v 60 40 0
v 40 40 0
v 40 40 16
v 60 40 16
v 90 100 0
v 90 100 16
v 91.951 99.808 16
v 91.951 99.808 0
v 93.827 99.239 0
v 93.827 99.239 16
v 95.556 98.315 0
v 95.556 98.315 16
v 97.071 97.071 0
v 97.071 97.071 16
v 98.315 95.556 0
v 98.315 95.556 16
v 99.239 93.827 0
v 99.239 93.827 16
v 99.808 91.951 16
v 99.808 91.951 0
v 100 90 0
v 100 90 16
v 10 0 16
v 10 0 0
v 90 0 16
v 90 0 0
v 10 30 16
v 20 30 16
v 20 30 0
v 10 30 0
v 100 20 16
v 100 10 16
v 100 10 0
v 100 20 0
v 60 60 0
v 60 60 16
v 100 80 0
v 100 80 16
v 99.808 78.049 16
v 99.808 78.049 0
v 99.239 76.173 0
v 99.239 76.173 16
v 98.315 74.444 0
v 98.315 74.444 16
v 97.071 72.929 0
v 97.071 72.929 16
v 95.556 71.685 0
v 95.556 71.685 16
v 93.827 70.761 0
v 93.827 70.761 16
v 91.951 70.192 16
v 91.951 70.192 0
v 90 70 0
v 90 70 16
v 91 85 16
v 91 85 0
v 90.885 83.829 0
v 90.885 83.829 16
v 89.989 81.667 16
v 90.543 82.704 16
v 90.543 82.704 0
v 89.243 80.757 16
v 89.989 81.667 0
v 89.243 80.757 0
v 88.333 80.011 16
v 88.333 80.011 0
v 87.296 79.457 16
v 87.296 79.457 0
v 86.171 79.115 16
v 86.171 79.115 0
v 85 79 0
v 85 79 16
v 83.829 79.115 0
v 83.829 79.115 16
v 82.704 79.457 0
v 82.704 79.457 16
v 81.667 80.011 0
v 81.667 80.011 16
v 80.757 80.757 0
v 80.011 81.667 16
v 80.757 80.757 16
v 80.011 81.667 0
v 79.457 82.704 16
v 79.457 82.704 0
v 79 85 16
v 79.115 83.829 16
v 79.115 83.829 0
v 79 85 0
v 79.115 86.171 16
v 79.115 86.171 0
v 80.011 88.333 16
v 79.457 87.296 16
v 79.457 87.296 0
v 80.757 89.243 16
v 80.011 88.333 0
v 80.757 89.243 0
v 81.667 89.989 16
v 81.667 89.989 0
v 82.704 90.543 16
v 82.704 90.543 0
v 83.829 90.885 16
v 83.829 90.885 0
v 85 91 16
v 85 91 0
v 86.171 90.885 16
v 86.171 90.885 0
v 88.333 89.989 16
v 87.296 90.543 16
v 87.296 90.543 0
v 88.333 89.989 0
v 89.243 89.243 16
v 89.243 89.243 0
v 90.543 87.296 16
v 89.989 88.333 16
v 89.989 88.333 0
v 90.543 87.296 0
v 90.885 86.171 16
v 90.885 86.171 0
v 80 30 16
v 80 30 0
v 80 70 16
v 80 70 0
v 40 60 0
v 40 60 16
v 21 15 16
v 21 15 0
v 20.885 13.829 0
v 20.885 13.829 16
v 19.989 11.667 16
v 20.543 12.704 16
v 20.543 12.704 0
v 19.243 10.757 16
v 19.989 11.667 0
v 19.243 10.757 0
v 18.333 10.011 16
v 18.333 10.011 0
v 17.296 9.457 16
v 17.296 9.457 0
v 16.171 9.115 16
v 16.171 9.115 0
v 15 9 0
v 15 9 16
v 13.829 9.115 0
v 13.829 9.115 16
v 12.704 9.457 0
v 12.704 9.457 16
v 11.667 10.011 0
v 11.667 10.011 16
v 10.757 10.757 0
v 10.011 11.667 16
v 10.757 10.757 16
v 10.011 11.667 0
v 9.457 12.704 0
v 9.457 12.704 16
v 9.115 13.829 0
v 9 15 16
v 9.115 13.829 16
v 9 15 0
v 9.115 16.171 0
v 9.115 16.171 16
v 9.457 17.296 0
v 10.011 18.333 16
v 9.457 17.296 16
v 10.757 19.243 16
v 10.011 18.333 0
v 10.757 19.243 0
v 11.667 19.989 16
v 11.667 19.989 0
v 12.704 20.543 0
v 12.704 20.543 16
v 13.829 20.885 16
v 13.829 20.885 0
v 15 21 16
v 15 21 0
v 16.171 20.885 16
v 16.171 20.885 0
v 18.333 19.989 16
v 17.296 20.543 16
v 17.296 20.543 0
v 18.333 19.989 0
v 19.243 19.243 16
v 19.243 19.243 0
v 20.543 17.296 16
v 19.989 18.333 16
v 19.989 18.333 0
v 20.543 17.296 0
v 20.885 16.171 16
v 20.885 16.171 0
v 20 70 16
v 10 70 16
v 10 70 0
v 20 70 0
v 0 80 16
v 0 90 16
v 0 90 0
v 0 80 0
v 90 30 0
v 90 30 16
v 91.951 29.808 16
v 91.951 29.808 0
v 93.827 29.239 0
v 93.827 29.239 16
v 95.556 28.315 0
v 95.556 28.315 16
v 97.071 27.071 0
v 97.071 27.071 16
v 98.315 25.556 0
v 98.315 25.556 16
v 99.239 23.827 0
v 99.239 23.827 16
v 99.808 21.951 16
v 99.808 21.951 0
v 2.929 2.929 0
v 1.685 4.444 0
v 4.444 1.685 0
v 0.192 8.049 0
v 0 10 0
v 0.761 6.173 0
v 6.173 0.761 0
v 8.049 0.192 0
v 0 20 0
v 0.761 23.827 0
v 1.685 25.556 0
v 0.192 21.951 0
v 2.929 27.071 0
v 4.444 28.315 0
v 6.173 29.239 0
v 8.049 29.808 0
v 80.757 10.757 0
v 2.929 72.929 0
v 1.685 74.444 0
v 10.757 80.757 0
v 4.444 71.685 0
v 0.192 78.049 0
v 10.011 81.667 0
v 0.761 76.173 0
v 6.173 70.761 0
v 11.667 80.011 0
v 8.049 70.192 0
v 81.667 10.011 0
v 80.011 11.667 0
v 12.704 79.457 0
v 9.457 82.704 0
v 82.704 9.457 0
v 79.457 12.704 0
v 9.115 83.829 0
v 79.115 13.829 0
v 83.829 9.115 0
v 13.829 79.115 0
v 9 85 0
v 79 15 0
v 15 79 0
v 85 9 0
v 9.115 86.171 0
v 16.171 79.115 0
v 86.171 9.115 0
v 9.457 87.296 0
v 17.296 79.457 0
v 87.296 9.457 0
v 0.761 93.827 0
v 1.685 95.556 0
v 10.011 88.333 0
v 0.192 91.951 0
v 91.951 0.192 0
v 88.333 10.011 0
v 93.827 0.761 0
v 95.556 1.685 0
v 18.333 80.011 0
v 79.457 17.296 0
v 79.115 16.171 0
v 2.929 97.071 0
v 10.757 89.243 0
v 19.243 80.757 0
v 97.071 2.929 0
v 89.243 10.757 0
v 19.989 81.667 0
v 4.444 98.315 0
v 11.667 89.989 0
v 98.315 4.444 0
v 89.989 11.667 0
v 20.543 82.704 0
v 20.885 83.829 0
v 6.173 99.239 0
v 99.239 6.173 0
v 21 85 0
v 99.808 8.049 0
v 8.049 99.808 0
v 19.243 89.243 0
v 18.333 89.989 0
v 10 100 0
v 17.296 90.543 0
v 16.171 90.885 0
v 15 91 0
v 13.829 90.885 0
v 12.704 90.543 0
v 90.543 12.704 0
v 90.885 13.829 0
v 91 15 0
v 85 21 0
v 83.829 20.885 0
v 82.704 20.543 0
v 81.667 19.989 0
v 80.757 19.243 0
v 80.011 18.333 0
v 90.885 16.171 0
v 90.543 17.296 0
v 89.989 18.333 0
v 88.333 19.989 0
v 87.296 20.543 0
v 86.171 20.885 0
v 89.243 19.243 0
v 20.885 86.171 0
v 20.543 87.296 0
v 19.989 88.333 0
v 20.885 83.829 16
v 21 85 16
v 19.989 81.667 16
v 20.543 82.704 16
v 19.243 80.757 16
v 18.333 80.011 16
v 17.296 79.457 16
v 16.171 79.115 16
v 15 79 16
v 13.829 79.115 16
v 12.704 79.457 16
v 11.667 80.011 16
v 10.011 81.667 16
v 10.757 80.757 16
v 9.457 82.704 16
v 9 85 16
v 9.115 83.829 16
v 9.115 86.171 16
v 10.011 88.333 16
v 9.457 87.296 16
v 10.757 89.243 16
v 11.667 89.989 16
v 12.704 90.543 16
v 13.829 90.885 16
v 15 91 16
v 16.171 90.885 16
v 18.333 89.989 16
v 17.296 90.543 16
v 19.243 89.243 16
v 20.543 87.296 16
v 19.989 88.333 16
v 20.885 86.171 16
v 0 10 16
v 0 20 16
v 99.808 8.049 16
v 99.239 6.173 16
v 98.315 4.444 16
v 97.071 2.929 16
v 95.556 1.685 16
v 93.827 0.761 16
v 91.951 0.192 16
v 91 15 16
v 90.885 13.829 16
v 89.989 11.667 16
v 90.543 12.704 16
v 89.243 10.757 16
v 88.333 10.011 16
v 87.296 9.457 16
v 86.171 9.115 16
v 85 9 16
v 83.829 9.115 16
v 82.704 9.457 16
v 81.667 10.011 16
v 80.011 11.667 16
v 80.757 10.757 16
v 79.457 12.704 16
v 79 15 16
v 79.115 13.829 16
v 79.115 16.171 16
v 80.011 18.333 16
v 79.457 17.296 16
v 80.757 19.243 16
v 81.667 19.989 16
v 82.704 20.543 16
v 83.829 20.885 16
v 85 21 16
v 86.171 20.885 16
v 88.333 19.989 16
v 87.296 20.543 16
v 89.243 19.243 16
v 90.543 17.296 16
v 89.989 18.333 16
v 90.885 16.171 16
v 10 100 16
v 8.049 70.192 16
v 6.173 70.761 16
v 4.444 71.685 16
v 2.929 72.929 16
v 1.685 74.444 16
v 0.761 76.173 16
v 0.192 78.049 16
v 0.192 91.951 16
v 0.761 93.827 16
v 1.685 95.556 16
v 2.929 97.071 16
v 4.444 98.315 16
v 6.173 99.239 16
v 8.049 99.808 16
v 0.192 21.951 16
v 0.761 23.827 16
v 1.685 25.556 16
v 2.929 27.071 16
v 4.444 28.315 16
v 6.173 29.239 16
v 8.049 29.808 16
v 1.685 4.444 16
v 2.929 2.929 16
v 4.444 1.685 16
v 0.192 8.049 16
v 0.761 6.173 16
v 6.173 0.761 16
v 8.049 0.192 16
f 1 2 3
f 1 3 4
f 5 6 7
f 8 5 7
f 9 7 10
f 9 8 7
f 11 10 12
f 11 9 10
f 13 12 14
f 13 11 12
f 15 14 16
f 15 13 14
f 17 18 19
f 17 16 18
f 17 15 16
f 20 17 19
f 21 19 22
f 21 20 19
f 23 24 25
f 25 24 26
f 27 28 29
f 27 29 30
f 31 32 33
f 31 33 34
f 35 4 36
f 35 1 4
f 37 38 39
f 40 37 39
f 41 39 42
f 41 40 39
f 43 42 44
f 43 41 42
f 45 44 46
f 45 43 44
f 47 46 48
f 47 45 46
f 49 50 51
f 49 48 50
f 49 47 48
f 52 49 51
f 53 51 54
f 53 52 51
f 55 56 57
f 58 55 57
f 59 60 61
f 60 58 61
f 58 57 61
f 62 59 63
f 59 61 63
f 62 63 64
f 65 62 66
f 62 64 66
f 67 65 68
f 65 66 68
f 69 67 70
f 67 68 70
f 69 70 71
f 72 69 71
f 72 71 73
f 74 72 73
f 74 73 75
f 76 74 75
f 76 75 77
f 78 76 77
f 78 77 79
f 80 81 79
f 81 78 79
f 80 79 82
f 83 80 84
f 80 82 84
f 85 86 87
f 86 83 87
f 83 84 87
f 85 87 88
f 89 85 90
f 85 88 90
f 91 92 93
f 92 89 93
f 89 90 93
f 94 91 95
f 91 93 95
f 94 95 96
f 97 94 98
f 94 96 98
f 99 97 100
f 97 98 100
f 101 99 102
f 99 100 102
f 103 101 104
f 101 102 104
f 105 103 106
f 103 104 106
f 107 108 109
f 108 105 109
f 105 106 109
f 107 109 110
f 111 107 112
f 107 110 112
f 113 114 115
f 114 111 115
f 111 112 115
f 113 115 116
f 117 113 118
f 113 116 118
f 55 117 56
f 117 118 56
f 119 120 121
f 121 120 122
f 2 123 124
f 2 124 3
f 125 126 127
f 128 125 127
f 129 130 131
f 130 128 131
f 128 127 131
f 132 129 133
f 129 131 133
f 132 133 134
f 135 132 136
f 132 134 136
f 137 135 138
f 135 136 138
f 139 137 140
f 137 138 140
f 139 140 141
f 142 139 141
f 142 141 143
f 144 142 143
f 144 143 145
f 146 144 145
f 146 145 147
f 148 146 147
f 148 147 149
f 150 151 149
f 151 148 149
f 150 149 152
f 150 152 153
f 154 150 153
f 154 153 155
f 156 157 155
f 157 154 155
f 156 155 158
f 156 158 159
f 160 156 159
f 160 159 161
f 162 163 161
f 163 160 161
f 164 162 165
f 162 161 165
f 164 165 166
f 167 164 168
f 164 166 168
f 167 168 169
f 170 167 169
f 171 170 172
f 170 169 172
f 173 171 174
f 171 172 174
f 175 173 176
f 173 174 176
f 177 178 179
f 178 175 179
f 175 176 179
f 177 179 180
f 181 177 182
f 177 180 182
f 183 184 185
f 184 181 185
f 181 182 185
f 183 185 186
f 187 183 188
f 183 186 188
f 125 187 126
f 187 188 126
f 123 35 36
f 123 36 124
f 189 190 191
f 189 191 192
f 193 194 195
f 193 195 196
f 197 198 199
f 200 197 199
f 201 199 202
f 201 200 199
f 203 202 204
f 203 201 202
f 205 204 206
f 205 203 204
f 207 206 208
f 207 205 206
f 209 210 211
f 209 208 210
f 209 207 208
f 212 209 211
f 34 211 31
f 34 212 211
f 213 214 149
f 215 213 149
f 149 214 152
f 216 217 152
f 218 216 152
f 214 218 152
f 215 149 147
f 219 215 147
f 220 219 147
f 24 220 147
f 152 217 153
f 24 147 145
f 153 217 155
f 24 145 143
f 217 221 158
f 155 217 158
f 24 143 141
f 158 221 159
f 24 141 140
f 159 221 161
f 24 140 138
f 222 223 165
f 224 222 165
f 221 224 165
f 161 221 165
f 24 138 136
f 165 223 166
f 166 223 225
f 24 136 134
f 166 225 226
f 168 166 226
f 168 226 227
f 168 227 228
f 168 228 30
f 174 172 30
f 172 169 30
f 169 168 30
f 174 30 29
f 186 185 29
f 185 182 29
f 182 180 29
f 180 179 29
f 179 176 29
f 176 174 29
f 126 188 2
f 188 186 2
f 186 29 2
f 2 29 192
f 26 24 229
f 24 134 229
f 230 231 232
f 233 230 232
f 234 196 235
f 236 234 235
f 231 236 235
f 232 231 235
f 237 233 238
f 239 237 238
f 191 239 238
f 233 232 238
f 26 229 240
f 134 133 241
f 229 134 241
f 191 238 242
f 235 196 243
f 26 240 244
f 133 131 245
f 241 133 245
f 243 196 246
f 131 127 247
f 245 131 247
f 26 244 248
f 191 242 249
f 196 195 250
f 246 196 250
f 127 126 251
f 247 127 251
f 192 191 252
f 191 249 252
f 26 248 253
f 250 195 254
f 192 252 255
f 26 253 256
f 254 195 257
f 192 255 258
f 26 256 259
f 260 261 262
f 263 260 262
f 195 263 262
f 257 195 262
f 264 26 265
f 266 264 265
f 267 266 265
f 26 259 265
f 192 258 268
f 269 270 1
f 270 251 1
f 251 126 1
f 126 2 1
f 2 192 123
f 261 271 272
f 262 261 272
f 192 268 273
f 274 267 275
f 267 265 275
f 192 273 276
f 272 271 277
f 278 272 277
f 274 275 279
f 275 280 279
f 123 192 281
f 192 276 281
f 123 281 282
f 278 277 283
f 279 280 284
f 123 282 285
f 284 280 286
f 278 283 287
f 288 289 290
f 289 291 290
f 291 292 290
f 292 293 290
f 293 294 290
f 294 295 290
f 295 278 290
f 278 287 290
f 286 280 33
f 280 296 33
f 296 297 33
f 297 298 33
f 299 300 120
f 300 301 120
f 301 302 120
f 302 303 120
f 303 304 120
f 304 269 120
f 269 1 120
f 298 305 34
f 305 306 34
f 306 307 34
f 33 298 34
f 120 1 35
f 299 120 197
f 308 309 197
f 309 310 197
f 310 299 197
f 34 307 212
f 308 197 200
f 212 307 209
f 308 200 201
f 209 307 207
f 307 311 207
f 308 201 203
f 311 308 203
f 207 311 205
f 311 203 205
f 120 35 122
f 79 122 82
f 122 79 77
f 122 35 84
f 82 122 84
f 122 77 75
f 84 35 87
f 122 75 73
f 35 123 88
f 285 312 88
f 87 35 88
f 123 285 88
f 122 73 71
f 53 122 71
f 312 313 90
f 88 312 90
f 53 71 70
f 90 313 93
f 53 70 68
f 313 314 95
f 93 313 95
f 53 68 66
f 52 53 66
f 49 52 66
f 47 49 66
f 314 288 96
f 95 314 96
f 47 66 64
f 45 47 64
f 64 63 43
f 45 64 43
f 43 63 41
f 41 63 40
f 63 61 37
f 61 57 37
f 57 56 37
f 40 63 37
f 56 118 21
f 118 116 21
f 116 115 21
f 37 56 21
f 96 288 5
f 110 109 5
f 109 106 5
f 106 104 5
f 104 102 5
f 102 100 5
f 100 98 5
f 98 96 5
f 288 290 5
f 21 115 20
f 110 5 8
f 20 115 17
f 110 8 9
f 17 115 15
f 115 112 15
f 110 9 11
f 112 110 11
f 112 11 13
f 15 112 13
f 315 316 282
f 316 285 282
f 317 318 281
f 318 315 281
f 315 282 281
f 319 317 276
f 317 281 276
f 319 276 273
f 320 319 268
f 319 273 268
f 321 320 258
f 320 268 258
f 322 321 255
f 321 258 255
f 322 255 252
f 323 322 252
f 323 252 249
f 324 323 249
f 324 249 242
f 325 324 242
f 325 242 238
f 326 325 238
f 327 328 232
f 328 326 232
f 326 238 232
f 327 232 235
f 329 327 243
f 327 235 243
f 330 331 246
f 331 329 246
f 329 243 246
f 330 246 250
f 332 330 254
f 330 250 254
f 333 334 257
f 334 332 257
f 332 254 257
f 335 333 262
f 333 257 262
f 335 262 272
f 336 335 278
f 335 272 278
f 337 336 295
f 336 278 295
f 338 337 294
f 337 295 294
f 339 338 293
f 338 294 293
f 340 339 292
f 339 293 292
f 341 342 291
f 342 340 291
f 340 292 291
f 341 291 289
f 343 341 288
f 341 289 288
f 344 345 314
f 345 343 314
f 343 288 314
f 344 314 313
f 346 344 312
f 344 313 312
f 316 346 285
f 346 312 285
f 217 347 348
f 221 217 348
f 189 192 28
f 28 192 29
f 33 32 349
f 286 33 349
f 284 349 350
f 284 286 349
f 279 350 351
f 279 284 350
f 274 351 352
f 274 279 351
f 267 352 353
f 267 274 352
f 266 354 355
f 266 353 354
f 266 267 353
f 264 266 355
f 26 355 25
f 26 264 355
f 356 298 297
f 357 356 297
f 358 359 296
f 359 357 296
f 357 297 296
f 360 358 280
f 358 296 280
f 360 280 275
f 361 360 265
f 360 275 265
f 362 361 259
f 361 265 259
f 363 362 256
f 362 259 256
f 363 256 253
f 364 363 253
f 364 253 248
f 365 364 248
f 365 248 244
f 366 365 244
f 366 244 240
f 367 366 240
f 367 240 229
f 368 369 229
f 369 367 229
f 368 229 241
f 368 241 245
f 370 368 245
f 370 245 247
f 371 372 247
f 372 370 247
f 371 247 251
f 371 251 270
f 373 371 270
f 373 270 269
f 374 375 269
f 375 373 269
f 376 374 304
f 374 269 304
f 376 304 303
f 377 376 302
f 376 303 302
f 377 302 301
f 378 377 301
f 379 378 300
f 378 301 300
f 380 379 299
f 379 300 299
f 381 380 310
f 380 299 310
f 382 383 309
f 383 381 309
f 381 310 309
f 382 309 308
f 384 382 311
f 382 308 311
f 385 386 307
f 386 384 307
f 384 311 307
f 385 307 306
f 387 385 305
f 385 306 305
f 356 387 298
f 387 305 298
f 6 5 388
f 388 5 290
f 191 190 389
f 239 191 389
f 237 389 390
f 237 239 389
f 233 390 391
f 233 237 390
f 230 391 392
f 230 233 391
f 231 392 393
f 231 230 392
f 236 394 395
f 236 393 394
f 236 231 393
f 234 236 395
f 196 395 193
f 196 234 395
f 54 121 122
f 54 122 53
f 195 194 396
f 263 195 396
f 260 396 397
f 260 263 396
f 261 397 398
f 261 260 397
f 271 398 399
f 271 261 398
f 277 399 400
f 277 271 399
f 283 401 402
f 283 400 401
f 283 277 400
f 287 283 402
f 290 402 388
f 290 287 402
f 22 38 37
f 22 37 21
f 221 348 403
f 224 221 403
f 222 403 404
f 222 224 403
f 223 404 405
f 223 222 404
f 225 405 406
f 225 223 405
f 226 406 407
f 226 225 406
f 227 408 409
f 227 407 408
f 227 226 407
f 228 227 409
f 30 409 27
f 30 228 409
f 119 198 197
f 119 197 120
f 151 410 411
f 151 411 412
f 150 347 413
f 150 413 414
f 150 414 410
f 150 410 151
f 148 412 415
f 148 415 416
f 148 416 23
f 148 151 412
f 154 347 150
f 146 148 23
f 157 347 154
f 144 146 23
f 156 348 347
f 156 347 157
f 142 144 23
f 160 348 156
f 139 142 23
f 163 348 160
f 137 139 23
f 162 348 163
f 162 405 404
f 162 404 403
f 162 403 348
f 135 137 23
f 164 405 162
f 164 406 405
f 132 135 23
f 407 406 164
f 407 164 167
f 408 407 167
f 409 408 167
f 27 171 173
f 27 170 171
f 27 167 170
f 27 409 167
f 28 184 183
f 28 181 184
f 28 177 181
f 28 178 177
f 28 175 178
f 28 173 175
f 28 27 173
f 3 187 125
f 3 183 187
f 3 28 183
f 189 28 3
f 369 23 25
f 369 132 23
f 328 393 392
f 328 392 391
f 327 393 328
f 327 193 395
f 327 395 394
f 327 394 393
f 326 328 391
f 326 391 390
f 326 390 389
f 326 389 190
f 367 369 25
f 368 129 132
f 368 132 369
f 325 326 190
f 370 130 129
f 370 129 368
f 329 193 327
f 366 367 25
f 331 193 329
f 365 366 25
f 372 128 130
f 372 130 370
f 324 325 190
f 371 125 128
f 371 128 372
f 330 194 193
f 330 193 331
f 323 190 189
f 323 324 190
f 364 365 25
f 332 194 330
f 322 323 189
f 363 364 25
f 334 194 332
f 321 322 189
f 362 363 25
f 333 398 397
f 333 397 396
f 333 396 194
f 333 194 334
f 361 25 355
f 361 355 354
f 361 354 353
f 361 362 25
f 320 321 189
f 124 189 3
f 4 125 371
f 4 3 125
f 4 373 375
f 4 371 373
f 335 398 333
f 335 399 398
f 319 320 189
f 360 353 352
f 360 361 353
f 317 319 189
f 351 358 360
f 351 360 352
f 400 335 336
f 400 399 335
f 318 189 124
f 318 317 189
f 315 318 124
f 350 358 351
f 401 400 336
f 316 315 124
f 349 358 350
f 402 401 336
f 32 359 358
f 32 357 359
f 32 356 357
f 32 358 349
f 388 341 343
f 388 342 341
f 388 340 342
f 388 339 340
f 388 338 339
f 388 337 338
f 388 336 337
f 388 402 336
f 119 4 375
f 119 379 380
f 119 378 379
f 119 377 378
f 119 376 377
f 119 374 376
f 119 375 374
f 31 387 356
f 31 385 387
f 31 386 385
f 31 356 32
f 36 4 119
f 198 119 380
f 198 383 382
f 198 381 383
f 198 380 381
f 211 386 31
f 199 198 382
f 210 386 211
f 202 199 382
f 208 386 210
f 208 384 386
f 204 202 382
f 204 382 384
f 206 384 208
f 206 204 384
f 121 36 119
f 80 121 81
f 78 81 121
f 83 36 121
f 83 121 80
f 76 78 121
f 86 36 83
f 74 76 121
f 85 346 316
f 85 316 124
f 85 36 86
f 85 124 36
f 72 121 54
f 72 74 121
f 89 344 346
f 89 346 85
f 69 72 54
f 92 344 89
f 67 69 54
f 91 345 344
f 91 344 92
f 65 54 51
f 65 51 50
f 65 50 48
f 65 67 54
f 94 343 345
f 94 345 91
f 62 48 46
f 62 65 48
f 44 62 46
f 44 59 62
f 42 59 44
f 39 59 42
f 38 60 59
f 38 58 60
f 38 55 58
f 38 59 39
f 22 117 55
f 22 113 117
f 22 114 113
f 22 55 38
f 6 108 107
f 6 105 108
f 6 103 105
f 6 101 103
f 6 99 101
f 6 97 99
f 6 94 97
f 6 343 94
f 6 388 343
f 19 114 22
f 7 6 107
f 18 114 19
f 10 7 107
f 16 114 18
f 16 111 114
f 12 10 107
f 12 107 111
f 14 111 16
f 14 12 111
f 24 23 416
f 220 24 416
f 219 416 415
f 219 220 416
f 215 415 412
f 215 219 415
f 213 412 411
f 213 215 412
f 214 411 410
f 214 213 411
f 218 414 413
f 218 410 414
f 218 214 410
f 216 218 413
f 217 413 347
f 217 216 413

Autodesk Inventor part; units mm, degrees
ref_plane "YZ Plane" through (0, 0, 0) normal (1, 0, 0) x (0, 1, 0)
ref_plane "XZ Plane" through (0, 0, 0) normal (0, 1, 0) x (-1, 0, 0)
ref_plane "XY Plane" through (0, 0, 0) normal (0, 0, 1) x (1, 0, 0)
sketch "Sketch1" plane through (0, 0, 0) normal (0, 0, 1) x (1, 0, 0)
  line L0 (10, 0) -> (90, 0)
  line L1 (100, 10) -> (100, 20)
  line L2 (90, 30) -> (80, 30)
  line L3 (80, 30) -> (80, 70)
  line L4 (80, 70) -> (90, 70)
  line L5 (100, 80) -> (100, 90)
  line L6 (90, 100) -> (10, 100)
  line L7 (0, 90) -> (0, 80)
  line L8 (10, 70) -> (20, 70)
  line L9 (20, 70) -> (20, 30)
  line L10 (20, 30) -> (10, 30)
  line L11 (0, 10) -> (0, 20)
  line L12 (40, 40) -> (60, 40)
  line L13 (60, 40) -> (60, 60)
  line L14 (60, 60) -> (40, 60)
  line L15 (40, 60) -> (40, 40)
  circle A0 centre (15, 15) radius 6
  circle A1 centre (85, 15) radius 6
  circle A2 centre (15, 85) radius 6
  circle A3 centre (85, 85) radius 6
  arc A4 (10, 100) -> (0, 90) centre (10, 90) ccw
  arc A5 (0, 80) -> (10, 70) centre (10, 80) ccw
  arc A6 (90, 70) -> (100, 80) centre (90, 80) ccw
  arc A7 (100, 90) -> (90, 100) centre (90, 90) ccw
  arc A8 (100, 20) -> (90, 30) centre (90, 20) ccw
  arc A9 (90, 0) -> (100, 10) centre (90, 10) ccw
  arc A10 (0, 10) -> (10, 0) centre (10, 10) ccw
  arc A11 (10, 30) -> (0, 20) centre (10, 20) ccw
  point P0 (0, 0)
  point P1 (100, 70)
  point P2 (100, 100)
  point P3 (0, 70)
  point P4 (0, 30)
  dimension "d0" = 10
extrude "Extrusion1" add sketch "Sketch1" along normal blind 16
properties part number "P2-8"
